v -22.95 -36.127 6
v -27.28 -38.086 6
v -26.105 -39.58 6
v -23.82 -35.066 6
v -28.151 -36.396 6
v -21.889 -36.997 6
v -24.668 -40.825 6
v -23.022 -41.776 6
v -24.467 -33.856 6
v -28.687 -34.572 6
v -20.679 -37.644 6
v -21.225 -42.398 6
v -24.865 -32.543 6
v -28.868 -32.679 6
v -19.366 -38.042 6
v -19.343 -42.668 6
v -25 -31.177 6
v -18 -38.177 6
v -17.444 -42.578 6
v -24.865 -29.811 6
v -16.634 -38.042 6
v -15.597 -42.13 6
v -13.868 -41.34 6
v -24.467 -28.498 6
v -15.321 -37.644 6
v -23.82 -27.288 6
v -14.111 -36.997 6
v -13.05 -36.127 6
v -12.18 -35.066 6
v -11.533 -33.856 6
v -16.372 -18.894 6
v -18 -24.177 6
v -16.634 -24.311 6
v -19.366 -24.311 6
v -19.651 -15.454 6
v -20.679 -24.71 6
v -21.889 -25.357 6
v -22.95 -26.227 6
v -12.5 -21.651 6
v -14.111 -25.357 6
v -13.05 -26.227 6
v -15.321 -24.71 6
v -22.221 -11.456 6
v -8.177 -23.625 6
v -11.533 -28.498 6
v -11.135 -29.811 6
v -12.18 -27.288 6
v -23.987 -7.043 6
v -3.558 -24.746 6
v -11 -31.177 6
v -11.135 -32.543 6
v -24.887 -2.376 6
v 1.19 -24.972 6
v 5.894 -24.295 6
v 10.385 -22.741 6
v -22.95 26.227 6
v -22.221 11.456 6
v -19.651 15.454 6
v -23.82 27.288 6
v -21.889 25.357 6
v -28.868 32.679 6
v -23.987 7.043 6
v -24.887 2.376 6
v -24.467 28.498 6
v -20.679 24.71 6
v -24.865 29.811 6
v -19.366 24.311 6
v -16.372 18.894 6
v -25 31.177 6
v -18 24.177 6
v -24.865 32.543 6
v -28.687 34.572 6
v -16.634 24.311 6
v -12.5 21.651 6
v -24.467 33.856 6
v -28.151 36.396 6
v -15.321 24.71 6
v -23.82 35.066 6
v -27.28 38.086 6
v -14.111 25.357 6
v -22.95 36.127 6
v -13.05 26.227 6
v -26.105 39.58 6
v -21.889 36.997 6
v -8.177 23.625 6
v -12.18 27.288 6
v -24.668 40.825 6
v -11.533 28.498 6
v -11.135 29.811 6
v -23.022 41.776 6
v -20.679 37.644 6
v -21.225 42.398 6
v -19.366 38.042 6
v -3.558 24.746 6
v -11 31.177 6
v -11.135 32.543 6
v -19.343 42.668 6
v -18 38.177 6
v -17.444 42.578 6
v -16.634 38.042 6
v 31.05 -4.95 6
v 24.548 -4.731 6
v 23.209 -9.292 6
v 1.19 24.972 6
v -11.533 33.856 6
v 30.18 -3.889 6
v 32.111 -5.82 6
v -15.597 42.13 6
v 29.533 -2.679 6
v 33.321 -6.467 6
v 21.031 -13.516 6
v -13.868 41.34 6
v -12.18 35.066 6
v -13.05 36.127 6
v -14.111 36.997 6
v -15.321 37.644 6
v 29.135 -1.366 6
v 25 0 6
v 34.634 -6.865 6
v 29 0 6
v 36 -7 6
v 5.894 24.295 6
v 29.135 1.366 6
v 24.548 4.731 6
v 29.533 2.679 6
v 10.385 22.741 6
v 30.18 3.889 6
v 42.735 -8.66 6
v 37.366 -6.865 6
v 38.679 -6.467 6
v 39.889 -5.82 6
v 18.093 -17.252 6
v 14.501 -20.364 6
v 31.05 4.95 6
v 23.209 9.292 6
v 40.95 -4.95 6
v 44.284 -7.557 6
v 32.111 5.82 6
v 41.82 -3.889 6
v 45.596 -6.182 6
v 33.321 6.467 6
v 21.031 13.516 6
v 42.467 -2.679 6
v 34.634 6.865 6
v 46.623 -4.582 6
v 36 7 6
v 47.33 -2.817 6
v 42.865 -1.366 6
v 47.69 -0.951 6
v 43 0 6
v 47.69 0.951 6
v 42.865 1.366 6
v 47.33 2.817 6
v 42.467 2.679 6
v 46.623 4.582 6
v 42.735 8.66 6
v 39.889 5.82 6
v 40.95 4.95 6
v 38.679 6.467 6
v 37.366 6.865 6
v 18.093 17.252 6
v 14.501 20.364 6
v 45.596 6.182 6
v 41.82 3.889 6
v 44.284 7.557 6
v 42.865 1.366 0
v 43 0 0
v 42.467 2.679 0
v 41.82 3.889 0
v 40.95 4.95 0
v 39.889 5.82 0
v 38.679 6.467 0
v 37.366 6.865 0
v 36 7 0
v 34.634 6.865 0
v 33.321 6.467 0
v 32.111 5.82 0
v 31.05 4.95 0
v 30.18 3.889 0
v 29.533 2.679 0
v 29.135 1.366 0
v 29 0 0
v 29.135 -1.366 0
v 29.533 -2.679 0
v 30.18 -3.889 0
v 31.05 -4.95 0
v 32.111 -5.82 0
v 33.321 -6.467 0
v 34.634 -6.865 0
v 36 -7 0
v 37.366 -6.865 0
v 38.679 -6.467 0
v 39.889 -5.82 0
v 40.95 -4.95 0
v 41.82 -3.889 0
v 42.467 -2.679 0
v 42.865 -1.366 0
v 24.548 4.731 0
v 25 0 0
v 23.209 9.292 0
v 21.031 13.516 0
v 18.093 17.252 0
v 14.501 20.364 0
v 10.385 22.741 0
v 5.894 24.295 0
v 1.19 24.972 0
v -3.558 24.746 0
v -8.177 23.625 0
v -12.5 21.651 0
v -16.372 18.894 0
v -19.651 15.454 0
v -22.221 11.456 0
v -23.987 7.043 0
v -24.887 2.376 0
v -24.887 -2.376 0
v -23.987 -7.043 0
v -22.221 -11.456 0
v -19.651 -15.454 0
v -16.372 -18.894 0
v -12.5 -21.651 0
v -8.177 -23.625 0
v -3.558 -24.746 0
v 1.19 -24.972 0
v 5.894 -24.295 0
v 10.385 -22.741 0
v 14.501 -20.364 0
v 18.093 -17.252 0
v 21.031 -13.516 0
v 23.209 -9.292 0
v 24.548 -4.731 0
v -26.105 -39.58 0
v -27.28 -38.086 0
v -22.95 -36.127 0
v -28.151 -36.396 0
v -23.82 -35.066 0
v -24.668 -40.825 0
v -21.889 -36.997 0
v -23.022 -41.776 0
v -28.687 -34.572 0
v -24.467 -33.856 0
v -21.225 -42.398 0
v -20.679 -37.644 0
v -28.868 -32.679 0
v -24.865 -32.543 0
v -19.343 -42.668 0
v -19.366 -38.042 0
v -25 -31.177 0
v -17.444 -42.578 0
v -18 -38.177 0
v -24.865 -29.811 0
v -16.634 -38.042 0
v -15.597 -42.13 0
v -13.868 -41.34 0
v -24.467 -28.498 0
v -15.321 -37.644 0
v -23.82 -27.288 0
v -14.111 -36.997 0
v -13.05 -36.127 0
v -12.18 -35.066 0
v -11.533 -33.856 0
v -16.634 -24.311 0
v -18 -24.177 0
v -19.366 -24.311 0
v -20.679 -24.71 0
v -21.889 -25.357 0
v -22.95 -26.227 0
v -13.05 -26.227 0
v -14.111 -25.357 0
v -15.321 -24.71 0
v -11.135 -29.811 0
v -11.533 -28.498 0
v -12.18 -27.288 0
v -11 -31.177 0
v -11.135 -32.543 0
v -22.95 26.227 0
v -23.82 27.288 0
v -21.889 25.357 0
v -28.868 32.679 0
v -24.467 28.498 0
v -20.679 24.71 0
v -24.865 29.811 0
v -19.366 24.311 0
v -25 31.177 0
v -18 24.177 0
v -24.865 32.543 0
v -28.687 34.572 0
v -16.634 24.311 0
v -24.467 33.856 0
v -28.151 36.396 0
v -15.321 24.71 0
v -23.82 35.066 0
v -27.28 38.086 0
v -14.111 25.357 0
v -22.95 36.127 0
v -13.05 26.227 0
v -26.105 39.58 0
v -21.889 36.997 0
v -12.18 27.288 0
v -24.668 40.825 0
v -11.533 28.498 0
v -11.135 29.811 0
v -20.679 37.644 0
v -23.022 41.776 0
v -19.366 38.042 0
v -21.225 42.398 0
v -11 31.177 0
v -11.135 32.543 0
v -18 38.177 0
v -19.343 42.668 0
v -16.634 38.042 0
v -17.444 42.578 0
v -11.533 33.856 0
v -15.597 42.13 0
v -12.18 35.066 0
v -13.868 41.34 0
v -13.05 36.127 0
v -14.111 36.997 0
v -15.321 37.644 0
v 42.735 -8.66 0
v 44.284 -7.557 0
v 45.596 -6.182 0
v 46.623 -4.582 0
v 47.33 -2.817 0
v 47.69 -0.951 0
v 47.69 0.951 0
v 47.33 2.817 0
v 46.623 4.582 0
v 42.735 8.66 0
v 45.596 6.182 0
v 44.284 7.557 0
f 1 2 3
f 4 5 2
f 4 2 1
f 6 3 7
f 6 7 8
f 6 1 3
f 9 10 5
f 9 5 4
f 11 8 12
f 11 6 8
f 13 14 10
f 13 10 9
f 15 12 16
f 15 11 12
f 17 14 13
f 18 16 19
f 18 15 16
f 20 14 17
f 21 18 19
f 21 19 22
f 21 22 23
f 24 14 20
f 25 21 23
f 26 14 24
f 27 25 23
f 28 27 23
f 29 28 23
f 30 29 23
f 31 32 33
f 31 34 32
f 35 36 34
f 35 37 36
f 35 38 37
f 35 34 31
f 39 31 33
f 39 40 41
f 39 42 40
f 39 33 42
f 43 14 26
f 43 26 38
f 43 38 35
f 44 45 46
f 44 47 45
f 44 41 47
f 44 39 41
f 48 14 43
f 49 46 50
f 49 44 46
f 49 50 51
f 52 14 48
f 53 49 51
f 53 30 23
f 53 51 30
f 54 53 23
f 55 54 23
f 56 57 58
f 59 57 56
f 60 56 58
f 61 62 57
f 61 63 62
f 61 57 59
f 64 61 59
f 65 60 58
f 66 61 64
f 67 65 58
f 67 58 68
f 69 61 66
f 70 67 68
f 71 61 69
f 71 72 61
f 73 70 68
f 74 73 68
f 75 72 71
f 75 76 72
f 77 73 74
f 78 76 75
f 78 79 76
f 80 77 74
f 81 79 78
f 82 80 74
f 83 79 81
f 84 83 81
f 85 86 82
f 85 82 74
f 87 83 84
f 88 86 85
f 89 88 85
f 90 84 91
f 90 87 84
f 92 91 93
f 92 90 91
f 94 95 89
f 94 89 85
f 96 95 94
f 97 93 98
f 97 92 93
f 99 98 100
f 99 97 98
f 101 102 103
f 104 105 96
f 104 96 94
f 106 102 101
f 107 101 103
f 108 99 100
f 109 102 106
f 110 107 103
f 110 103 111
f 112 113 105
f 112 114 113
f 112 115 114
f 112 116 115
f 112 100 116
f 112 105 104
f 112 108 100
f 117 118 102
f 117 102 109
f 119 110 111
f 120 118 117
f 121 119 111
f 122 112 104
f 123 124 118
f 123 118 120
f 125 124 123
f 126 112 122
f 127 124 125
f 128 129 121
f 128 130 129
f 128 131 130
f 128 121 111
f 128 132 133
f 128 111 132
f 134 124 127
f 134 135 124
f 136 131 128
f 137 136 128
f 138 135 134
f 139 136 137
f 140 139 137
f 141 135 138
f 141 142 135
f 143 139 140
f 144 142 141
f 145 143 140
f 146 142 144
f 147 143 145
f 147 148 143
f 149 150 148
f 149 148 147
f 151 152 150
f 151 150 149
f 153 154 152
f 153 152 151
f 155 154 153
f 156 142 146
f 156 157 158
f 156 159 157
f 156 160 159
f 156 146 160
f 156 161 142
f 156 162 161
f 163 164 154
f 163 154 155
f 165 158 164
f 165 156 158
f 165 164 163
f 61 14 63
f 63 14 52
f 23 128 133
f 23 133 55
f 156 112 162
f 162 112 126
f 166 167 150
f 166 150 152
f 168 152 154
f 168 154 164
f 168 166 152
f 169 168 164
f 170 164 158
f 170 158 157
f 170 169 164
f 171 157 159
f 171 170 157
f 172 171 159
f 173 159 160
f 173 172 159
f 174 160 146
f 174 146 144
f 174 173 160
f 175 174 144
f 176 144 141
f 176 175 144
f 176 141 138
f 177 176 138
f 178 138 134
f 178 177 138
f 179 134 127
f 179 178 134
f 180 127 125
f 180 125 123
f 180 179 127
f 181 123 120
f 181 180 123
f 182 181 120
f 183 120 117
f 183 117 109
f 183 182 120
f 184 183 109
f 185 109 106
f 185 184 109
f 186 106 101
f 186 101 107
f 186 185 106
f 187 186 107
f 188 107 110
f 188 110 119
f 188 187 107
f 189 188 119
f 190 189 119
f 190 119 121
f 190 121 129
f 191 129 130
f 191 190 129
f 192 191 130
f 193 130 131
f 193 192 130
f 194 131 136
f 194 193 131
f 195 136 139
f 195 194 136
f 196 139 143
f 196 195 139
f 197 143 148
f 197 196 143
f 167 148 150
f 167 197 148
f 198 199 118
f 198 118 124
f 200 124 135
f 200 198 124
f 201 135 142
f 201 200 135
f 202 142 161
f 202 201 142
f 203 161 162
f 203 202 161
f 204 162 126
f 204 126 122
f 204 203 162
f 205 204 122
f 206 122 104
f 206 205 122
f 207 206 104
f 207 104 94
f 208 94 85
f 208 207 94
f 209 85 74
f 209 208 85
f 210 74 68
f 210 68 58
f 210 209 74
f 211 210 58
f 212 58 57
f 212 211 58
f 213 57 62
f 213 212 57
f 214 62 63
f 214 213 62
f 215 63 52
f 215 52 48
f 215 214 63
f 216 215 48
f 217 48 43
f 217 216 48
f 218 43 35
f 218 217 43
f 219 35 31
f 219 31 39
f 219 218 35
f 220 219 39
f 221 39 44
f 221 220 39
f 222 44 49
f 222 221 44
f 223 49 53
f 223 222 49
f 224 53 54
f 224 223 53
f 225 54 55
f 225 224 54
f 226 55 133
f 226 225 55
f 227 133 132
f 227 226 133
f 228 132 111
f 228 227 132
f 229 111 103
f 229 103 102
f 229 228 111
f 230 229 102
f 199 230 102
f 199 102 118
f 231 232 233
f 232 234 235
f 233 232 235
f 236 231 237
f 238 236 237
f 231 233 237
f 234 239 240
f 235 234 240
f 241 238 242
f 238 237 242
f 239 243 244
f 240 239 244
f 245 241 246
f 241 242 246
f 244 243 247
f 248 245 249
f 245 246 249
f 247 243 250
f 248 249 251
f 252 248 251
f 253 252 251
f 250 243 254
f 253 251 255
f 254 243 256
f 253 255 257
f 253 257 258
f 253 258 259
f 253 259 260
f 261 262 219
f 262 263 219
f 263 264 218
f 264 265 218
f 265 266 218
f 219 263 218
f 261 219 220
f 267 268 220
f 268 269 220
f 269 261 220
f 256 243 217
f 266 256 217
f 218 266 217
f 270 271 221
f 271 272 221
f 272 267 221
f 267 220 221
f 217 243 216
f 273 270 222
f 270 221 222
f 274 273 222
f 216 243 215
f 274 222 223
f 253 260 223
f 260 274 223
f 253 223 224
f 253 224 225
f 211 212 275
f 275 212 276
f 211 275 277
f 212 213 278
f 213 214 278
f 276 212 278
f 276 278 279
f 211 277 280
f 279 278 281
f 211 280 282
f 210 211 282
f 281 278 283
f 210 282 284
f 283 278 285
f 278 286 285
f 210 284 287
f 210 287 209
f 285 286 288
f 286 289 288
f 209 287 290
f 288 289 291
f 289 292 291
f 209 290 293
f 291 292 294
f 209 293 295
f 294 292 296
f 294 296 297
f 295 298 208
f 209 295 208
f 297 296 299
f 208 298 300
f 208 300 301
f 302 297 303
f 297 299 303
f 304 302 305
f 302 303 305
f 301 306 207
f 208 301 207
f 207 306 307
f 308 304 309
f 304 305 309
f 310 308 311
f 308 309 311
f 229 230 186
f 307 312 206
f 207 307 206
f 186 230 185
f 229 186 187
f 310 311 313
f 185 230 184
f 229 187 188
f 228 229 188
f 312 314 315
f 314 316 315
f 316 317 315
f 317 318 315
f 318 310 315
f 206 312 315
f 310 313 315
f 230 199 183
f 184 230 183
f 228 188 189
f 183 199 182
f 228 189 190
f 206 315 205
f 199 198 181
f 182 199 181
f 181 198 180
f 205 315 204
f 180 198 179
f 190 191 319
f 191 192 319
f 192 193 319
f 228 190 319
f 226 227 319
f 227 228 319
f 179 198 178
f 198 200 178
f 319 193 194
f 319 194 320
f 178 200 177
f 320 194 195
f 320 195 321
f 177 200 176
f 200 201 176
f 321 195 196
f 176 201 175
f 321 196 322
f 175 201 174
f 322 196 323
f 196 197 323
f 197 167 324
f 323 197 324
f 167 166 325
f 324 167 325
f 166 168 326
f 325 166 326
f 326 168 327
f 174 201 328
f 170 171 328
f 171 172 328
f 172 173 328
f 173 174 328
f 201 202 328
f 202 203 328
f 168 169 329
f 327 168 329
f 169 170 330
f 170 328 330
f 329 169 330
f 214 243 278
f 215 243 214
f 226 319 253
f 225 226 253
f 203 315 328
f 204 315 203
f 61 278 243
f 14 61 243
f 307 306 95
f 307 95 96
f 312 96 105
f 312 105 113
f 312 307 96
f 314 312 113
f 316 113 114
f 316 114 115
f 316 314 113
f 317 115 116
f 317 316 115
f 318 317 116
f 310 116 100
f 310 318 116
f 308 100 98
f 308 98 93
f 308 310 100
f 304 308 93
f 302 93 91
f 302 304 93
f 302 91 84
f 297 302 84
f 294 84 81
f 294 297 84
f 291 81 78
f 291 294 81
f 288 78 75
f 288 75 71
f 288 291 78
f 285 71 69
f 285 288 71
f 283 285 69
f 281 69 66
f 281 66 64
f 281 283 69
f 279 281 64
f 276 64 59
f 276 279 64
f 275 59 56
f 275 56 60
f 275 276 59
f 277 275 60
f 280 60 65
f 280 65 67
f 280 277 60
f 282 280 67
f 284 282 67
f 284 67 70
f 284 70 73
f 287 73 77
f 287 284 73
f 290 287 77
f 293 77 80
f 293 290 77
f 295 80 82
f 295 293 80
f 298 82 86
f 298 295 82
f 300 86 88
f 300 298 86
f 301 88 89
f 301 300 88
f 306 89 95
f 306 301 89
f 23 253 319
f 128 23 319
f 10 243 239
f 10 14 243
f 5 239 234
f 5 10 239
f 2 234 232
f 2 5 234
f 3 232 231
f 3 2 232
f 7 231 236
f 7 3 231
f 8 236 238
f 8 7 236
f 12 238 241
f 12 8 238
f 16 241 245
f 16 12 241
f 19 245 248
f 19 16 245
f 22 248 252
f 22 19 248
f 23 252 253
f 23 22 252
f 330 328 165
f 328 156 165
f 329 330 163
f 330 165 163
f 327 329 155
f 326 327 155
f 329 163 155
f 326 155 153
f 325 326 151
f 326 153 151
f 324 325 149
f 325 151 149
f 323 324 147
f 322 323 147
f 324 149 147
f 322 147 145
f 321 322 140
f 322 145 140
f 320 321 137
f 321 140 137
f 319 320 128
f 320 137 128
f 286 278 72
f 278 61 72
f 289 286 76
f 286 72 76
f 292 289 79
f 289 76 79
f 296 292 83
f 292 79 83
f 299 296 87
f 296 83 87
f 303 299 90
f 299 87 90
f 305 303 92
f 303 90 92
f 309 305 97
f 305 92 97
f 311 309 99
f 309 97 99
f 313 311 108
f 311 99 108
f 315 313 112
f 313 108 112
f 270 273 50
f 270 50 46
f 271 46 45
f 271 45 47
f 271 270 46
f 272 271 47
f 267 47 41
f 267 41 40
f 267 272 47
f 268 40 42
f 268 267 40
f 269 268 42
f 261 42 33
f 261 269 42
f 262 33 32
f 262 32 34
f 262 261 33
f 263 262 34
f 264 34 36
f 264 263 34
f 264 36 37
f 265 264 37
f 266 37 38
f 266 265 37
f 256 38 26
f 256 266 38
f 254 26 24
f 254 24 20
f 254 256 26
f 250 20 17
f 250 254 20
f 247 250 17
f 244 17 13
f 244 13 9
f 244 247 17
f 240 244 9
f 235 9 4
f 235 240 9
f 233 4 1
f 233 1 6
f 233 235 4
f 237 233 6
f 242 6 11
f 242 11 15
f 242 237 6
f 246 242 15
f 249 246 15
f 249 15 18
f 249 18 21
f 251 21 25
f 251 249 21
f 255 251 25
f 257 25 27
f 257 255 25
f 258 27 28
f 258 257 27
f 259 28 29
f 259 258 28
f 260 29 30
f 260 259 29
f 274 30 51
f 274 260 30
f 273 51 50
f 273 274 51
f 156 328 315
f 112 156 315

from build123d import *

# Parameters (mm, degrees)
F0_R     = 7
F0_R_2   = 25
F1_DEPTH = 6
F2_R     = 10


with BuildPart() as f1:
    # F0 (on Top) → F1 (new body)
    with BuildSketch(Plane.XY):
        Polygon((-28.867513, 50), (-28.867513, -50), (57.735027, 0), align=None)
        with Locations((-18, -31.176915)):
            Circle(F0_R, mode=Mode.SUBTRACT)
        Circle(F0_R_2, mode=Mode.SUBTRACT)
        with Locations((-18, 31.176915)):
            Circle(F0_R, mode=Mode.SUBTRACT)
        with Locations((36, 0)):
            Circle(F0_R, mode=Mode.SUBTRACT)
    extrude(amount=F1_DEPTH)

    # F2
    f2_edges = [f1.edges().sort_by_distance(p)[0] for p in [
        (-28.867513, -50, 3),
        (57.735027, 0, 3),
        (-28.867513, 50, 3),
    ]]
    fillet(f2_edges, radius=F2_R)


solid = f1.part
